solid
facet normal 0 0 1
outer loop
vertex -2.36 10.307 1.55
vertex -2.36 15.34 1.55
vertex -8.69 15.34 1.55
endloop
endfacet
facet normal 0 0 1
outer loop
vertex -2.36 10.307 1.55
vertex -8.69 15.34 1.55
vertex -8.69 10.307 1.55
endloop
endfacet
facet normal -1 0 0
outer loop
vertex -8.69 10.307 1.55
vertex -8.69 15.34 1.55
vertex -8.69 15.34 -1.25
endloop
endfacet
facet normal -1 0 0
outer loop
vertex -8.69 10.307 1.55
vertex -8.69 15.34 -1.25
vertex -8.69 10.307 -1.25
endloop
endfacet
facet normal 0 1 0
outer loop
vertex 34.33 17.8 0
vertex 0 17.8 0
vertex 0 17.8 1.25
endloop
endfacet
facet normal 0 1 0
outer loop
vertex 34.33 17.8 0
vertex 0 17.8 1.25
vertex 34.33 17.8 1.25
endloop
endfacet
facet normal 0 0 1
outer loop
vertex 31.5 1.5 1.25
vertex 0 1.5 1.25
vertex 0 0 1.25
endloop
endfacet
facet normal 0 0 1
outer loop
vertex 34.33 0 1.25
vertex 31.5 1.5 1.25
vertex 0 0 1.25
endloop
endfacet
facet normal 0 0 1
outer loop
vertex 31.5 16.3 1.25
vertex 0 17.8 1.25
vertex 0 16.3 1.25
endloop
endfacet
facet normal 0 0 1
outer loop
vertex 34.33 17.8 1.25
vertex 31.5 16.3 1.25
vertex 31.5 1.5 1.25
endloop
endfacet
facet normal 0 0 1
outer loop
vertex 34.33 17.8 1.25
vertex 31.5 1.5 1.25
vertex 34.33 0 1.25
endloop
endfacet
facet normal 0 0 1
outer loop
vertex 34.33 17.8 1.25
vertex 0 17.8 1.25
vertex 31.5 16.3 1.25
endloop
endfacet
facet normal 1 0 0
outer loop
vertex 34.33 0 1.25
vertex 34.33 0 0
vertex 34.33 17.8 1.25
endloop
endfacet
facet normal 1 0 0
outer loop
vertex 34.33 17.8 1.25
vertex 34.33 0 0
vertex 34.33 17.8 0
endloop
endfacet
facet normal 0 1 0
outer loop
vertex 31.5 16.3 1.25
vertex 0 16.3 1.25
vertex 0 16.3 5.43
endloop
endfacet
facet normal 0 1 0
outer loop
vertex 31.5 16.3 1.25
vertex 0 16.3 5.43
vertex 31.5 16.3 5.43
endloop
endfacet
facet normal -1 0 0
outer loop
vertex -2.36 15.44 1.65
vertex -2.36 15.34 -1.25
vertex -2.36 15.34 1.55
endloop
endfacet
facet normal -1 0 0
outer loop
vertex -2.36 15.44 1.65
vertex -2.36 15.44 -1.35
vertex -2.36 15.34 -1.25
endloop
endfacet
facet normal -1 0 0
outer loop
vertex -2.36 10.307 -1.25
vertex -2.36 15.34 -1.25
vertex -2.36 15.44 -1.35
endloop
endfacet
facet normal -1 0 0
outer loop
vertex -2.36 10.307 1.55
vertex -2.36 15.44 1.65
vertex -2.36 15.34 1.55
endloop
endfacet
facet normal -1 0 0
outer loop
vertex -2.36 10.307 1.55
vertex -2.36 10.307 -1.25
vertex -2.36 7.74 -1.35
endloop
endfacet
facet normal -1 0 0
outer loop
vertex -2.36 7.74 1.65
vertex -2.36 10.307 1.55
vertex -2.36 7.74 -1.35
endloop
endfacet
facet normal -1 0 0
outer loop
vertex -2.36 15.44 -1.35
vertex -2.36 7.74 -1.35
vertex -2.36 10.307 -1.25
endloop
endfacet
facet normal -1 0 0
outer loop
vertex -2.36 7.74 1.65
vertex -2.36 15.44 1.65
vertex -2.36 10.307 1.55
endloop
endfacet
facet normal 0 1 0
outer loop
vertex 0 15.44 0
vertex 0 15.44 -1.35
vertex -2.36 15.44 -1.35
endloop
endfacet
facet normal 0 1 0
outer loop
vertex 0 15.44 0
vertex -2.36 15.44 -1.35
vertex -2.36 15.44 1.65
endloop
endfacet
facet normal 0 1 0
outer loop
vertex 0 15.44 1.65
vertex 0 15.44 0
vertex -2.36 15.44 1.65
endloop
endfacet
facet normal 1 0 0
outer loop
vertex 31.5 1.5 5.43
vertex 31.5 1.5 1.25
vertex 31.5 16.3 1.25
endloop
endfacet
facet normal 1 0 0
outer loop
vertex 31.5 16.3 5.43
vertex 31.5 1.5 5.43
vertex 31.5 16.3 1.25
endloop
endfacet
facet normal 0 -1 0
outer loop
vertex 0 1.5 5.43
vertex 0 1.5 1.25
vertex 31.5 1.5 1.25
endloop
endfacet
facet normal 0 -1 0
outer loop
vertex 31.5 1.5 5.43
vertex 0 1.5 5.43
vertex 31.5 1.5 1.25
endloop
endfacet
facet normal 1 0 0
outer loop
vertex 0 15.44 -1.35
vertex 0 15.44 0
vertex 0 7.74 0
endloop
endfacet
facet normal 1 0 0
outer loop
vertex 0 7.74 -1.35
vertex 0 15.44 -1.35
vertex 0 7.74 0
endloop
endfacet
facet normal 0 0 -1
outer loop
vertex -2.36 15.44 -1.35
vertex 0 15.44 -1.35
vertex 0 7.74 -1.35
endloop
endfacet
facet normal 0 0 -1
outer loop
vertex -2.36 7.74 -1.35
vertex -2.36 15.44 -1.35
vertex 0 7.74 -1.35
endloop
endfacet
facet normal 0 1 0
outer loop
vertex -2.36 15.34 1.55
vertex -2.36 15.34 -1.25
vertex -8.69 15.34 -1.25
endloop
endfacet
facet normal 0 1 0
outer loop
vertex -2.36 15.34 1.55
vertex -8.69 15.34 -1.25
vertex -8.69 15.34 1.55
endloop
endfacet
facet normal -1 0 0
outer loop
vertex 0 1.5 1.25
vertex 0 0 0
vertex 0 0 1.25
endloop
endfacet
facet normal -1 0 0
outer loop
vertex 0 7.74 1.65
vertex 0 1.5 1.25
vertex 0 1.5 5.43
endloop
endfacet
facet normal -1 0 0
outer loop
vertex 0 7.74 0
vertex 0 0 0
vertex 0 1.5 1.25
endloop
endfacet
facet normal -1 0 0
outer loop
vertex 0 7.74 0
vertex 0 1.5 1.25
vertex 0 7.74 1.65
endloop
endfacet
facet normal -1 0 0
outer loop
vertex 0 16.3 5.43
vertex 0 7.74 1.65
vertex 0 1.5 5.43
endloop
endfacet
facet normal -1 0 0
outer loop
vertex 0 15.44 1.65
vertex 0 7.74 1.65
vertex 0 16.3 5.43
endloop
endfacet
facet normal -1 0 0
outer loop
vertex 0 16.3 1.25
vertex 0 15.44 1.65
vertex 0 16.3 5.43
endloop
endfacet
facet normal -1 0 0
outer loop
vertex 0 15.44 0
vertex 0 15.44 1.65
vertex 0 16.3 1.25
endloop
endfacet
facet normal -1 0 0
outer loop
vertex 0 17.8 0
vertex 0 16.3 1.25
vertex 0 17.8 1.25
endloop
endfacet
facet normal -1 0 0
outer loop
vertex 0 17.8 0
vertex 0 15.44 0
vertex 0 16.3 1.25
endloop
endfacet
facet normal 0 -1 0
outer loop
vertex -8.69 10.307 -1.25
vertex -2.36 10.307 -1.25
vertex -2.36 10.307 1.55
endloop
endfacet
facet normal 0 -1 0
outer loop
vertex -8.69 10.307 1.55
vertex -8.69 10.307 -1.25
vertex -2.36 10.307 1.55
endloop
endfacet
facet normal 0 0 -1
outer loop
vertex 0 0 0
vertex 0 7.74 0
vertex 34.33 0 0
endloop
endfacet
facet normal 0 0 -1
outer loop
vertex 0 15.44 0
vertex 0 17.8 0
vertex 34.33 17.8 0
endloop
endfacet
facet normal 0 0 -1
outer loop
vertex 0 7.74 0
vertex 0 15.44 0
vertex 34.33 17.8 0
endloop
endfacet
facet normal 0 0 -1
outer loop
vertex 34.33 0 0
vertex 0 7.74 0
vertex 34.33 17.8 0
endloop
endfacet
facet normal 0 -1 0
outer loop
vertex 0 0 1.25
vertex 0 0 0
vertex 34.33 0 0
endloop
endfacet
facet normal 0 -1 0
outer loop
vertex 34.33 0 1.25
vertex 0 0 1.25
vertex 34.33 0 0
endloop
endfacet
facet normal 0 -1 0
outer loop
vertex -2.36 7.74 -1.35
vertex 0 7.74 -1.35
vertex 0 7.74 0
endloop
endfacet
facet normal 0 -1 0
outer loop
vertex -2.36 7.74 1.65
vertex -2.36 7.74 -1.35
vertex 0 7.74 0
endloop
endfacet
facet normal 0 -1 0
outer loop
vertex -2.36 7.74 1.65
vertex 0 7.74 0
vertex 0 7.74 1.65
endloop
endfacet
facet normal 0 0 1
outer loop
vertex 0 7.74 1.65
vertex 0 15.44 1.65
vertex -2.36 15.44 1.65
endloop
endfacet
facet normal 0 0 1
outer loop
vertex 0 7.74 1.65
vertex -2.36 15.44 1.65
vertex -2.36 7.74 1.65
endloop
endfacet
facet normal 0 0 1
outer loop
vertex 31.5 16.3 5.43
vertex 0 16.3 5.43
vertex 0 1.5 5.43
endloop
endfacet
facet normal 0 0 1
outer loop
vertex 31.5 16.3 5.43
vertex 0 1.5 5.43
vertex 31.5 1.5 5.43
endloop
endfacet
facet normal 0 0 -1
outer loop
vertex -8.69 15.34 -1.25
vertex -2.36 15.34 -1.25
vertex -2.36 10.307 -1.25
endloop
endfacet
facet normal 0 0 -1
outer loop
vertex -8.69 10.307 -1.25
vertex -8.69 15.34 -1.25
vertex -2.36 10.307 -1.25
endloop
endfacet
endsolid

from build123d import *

# Parameters (mm, degrees)
F0_W     = 34.33
F0_H     = 17.8
F1_DEPTH = 1.25
F2_W     = 31.5
F2_H     = 14.8
F3_DEPTH = 4.18
F4_W     = 7.7
F4_H     = 3
F5_DEPTH = 2.36
F6_W     = 5.033333
F6_H     = 2.8
F7_DEPTH = 6.33


with BuildPart() as f1:
    # F0 (on Top) → F1 (new body)
    with BuildSketch(Plane.XY):
        with Locations((17.165, 8.9)):
            Rectangle(F0_W, F0_H)
    extrude(amount=F1_DEPTH)

    # F2 (on face) → F3 (join)
    with BuildSketch(Plane.XY.offset(1.25)):
        with Locations((15.75, 8.9)):
            Rectangle(F2_W, F2_H)
    extrude(amount=F3_DEPTH)

    # F4 (on face) → F5 (join)
    with BuildSketch(Plane(origin=(0, 0, 0), x_dir=(0, -1, 0), z_dir=(-1, 0, 0))):
        with Locations((-11.59, 0.15)):
            Rectangle(F4_W, F4_H)
    extrude(amount=F5_DEPTH)

    # F6 (on face) → F7 (join)
    with BuildSketch(Plane(origin=(-2.36, 0, 0), x_dir=(0, -1, 0), z_dir=(-1, 0, 0))):
        with Locations((-12.823334, 0.15)):
            Rectangle(F6_W, F6_H)
    extrude(amount=F7_DEPTH)


solid = f1.part
